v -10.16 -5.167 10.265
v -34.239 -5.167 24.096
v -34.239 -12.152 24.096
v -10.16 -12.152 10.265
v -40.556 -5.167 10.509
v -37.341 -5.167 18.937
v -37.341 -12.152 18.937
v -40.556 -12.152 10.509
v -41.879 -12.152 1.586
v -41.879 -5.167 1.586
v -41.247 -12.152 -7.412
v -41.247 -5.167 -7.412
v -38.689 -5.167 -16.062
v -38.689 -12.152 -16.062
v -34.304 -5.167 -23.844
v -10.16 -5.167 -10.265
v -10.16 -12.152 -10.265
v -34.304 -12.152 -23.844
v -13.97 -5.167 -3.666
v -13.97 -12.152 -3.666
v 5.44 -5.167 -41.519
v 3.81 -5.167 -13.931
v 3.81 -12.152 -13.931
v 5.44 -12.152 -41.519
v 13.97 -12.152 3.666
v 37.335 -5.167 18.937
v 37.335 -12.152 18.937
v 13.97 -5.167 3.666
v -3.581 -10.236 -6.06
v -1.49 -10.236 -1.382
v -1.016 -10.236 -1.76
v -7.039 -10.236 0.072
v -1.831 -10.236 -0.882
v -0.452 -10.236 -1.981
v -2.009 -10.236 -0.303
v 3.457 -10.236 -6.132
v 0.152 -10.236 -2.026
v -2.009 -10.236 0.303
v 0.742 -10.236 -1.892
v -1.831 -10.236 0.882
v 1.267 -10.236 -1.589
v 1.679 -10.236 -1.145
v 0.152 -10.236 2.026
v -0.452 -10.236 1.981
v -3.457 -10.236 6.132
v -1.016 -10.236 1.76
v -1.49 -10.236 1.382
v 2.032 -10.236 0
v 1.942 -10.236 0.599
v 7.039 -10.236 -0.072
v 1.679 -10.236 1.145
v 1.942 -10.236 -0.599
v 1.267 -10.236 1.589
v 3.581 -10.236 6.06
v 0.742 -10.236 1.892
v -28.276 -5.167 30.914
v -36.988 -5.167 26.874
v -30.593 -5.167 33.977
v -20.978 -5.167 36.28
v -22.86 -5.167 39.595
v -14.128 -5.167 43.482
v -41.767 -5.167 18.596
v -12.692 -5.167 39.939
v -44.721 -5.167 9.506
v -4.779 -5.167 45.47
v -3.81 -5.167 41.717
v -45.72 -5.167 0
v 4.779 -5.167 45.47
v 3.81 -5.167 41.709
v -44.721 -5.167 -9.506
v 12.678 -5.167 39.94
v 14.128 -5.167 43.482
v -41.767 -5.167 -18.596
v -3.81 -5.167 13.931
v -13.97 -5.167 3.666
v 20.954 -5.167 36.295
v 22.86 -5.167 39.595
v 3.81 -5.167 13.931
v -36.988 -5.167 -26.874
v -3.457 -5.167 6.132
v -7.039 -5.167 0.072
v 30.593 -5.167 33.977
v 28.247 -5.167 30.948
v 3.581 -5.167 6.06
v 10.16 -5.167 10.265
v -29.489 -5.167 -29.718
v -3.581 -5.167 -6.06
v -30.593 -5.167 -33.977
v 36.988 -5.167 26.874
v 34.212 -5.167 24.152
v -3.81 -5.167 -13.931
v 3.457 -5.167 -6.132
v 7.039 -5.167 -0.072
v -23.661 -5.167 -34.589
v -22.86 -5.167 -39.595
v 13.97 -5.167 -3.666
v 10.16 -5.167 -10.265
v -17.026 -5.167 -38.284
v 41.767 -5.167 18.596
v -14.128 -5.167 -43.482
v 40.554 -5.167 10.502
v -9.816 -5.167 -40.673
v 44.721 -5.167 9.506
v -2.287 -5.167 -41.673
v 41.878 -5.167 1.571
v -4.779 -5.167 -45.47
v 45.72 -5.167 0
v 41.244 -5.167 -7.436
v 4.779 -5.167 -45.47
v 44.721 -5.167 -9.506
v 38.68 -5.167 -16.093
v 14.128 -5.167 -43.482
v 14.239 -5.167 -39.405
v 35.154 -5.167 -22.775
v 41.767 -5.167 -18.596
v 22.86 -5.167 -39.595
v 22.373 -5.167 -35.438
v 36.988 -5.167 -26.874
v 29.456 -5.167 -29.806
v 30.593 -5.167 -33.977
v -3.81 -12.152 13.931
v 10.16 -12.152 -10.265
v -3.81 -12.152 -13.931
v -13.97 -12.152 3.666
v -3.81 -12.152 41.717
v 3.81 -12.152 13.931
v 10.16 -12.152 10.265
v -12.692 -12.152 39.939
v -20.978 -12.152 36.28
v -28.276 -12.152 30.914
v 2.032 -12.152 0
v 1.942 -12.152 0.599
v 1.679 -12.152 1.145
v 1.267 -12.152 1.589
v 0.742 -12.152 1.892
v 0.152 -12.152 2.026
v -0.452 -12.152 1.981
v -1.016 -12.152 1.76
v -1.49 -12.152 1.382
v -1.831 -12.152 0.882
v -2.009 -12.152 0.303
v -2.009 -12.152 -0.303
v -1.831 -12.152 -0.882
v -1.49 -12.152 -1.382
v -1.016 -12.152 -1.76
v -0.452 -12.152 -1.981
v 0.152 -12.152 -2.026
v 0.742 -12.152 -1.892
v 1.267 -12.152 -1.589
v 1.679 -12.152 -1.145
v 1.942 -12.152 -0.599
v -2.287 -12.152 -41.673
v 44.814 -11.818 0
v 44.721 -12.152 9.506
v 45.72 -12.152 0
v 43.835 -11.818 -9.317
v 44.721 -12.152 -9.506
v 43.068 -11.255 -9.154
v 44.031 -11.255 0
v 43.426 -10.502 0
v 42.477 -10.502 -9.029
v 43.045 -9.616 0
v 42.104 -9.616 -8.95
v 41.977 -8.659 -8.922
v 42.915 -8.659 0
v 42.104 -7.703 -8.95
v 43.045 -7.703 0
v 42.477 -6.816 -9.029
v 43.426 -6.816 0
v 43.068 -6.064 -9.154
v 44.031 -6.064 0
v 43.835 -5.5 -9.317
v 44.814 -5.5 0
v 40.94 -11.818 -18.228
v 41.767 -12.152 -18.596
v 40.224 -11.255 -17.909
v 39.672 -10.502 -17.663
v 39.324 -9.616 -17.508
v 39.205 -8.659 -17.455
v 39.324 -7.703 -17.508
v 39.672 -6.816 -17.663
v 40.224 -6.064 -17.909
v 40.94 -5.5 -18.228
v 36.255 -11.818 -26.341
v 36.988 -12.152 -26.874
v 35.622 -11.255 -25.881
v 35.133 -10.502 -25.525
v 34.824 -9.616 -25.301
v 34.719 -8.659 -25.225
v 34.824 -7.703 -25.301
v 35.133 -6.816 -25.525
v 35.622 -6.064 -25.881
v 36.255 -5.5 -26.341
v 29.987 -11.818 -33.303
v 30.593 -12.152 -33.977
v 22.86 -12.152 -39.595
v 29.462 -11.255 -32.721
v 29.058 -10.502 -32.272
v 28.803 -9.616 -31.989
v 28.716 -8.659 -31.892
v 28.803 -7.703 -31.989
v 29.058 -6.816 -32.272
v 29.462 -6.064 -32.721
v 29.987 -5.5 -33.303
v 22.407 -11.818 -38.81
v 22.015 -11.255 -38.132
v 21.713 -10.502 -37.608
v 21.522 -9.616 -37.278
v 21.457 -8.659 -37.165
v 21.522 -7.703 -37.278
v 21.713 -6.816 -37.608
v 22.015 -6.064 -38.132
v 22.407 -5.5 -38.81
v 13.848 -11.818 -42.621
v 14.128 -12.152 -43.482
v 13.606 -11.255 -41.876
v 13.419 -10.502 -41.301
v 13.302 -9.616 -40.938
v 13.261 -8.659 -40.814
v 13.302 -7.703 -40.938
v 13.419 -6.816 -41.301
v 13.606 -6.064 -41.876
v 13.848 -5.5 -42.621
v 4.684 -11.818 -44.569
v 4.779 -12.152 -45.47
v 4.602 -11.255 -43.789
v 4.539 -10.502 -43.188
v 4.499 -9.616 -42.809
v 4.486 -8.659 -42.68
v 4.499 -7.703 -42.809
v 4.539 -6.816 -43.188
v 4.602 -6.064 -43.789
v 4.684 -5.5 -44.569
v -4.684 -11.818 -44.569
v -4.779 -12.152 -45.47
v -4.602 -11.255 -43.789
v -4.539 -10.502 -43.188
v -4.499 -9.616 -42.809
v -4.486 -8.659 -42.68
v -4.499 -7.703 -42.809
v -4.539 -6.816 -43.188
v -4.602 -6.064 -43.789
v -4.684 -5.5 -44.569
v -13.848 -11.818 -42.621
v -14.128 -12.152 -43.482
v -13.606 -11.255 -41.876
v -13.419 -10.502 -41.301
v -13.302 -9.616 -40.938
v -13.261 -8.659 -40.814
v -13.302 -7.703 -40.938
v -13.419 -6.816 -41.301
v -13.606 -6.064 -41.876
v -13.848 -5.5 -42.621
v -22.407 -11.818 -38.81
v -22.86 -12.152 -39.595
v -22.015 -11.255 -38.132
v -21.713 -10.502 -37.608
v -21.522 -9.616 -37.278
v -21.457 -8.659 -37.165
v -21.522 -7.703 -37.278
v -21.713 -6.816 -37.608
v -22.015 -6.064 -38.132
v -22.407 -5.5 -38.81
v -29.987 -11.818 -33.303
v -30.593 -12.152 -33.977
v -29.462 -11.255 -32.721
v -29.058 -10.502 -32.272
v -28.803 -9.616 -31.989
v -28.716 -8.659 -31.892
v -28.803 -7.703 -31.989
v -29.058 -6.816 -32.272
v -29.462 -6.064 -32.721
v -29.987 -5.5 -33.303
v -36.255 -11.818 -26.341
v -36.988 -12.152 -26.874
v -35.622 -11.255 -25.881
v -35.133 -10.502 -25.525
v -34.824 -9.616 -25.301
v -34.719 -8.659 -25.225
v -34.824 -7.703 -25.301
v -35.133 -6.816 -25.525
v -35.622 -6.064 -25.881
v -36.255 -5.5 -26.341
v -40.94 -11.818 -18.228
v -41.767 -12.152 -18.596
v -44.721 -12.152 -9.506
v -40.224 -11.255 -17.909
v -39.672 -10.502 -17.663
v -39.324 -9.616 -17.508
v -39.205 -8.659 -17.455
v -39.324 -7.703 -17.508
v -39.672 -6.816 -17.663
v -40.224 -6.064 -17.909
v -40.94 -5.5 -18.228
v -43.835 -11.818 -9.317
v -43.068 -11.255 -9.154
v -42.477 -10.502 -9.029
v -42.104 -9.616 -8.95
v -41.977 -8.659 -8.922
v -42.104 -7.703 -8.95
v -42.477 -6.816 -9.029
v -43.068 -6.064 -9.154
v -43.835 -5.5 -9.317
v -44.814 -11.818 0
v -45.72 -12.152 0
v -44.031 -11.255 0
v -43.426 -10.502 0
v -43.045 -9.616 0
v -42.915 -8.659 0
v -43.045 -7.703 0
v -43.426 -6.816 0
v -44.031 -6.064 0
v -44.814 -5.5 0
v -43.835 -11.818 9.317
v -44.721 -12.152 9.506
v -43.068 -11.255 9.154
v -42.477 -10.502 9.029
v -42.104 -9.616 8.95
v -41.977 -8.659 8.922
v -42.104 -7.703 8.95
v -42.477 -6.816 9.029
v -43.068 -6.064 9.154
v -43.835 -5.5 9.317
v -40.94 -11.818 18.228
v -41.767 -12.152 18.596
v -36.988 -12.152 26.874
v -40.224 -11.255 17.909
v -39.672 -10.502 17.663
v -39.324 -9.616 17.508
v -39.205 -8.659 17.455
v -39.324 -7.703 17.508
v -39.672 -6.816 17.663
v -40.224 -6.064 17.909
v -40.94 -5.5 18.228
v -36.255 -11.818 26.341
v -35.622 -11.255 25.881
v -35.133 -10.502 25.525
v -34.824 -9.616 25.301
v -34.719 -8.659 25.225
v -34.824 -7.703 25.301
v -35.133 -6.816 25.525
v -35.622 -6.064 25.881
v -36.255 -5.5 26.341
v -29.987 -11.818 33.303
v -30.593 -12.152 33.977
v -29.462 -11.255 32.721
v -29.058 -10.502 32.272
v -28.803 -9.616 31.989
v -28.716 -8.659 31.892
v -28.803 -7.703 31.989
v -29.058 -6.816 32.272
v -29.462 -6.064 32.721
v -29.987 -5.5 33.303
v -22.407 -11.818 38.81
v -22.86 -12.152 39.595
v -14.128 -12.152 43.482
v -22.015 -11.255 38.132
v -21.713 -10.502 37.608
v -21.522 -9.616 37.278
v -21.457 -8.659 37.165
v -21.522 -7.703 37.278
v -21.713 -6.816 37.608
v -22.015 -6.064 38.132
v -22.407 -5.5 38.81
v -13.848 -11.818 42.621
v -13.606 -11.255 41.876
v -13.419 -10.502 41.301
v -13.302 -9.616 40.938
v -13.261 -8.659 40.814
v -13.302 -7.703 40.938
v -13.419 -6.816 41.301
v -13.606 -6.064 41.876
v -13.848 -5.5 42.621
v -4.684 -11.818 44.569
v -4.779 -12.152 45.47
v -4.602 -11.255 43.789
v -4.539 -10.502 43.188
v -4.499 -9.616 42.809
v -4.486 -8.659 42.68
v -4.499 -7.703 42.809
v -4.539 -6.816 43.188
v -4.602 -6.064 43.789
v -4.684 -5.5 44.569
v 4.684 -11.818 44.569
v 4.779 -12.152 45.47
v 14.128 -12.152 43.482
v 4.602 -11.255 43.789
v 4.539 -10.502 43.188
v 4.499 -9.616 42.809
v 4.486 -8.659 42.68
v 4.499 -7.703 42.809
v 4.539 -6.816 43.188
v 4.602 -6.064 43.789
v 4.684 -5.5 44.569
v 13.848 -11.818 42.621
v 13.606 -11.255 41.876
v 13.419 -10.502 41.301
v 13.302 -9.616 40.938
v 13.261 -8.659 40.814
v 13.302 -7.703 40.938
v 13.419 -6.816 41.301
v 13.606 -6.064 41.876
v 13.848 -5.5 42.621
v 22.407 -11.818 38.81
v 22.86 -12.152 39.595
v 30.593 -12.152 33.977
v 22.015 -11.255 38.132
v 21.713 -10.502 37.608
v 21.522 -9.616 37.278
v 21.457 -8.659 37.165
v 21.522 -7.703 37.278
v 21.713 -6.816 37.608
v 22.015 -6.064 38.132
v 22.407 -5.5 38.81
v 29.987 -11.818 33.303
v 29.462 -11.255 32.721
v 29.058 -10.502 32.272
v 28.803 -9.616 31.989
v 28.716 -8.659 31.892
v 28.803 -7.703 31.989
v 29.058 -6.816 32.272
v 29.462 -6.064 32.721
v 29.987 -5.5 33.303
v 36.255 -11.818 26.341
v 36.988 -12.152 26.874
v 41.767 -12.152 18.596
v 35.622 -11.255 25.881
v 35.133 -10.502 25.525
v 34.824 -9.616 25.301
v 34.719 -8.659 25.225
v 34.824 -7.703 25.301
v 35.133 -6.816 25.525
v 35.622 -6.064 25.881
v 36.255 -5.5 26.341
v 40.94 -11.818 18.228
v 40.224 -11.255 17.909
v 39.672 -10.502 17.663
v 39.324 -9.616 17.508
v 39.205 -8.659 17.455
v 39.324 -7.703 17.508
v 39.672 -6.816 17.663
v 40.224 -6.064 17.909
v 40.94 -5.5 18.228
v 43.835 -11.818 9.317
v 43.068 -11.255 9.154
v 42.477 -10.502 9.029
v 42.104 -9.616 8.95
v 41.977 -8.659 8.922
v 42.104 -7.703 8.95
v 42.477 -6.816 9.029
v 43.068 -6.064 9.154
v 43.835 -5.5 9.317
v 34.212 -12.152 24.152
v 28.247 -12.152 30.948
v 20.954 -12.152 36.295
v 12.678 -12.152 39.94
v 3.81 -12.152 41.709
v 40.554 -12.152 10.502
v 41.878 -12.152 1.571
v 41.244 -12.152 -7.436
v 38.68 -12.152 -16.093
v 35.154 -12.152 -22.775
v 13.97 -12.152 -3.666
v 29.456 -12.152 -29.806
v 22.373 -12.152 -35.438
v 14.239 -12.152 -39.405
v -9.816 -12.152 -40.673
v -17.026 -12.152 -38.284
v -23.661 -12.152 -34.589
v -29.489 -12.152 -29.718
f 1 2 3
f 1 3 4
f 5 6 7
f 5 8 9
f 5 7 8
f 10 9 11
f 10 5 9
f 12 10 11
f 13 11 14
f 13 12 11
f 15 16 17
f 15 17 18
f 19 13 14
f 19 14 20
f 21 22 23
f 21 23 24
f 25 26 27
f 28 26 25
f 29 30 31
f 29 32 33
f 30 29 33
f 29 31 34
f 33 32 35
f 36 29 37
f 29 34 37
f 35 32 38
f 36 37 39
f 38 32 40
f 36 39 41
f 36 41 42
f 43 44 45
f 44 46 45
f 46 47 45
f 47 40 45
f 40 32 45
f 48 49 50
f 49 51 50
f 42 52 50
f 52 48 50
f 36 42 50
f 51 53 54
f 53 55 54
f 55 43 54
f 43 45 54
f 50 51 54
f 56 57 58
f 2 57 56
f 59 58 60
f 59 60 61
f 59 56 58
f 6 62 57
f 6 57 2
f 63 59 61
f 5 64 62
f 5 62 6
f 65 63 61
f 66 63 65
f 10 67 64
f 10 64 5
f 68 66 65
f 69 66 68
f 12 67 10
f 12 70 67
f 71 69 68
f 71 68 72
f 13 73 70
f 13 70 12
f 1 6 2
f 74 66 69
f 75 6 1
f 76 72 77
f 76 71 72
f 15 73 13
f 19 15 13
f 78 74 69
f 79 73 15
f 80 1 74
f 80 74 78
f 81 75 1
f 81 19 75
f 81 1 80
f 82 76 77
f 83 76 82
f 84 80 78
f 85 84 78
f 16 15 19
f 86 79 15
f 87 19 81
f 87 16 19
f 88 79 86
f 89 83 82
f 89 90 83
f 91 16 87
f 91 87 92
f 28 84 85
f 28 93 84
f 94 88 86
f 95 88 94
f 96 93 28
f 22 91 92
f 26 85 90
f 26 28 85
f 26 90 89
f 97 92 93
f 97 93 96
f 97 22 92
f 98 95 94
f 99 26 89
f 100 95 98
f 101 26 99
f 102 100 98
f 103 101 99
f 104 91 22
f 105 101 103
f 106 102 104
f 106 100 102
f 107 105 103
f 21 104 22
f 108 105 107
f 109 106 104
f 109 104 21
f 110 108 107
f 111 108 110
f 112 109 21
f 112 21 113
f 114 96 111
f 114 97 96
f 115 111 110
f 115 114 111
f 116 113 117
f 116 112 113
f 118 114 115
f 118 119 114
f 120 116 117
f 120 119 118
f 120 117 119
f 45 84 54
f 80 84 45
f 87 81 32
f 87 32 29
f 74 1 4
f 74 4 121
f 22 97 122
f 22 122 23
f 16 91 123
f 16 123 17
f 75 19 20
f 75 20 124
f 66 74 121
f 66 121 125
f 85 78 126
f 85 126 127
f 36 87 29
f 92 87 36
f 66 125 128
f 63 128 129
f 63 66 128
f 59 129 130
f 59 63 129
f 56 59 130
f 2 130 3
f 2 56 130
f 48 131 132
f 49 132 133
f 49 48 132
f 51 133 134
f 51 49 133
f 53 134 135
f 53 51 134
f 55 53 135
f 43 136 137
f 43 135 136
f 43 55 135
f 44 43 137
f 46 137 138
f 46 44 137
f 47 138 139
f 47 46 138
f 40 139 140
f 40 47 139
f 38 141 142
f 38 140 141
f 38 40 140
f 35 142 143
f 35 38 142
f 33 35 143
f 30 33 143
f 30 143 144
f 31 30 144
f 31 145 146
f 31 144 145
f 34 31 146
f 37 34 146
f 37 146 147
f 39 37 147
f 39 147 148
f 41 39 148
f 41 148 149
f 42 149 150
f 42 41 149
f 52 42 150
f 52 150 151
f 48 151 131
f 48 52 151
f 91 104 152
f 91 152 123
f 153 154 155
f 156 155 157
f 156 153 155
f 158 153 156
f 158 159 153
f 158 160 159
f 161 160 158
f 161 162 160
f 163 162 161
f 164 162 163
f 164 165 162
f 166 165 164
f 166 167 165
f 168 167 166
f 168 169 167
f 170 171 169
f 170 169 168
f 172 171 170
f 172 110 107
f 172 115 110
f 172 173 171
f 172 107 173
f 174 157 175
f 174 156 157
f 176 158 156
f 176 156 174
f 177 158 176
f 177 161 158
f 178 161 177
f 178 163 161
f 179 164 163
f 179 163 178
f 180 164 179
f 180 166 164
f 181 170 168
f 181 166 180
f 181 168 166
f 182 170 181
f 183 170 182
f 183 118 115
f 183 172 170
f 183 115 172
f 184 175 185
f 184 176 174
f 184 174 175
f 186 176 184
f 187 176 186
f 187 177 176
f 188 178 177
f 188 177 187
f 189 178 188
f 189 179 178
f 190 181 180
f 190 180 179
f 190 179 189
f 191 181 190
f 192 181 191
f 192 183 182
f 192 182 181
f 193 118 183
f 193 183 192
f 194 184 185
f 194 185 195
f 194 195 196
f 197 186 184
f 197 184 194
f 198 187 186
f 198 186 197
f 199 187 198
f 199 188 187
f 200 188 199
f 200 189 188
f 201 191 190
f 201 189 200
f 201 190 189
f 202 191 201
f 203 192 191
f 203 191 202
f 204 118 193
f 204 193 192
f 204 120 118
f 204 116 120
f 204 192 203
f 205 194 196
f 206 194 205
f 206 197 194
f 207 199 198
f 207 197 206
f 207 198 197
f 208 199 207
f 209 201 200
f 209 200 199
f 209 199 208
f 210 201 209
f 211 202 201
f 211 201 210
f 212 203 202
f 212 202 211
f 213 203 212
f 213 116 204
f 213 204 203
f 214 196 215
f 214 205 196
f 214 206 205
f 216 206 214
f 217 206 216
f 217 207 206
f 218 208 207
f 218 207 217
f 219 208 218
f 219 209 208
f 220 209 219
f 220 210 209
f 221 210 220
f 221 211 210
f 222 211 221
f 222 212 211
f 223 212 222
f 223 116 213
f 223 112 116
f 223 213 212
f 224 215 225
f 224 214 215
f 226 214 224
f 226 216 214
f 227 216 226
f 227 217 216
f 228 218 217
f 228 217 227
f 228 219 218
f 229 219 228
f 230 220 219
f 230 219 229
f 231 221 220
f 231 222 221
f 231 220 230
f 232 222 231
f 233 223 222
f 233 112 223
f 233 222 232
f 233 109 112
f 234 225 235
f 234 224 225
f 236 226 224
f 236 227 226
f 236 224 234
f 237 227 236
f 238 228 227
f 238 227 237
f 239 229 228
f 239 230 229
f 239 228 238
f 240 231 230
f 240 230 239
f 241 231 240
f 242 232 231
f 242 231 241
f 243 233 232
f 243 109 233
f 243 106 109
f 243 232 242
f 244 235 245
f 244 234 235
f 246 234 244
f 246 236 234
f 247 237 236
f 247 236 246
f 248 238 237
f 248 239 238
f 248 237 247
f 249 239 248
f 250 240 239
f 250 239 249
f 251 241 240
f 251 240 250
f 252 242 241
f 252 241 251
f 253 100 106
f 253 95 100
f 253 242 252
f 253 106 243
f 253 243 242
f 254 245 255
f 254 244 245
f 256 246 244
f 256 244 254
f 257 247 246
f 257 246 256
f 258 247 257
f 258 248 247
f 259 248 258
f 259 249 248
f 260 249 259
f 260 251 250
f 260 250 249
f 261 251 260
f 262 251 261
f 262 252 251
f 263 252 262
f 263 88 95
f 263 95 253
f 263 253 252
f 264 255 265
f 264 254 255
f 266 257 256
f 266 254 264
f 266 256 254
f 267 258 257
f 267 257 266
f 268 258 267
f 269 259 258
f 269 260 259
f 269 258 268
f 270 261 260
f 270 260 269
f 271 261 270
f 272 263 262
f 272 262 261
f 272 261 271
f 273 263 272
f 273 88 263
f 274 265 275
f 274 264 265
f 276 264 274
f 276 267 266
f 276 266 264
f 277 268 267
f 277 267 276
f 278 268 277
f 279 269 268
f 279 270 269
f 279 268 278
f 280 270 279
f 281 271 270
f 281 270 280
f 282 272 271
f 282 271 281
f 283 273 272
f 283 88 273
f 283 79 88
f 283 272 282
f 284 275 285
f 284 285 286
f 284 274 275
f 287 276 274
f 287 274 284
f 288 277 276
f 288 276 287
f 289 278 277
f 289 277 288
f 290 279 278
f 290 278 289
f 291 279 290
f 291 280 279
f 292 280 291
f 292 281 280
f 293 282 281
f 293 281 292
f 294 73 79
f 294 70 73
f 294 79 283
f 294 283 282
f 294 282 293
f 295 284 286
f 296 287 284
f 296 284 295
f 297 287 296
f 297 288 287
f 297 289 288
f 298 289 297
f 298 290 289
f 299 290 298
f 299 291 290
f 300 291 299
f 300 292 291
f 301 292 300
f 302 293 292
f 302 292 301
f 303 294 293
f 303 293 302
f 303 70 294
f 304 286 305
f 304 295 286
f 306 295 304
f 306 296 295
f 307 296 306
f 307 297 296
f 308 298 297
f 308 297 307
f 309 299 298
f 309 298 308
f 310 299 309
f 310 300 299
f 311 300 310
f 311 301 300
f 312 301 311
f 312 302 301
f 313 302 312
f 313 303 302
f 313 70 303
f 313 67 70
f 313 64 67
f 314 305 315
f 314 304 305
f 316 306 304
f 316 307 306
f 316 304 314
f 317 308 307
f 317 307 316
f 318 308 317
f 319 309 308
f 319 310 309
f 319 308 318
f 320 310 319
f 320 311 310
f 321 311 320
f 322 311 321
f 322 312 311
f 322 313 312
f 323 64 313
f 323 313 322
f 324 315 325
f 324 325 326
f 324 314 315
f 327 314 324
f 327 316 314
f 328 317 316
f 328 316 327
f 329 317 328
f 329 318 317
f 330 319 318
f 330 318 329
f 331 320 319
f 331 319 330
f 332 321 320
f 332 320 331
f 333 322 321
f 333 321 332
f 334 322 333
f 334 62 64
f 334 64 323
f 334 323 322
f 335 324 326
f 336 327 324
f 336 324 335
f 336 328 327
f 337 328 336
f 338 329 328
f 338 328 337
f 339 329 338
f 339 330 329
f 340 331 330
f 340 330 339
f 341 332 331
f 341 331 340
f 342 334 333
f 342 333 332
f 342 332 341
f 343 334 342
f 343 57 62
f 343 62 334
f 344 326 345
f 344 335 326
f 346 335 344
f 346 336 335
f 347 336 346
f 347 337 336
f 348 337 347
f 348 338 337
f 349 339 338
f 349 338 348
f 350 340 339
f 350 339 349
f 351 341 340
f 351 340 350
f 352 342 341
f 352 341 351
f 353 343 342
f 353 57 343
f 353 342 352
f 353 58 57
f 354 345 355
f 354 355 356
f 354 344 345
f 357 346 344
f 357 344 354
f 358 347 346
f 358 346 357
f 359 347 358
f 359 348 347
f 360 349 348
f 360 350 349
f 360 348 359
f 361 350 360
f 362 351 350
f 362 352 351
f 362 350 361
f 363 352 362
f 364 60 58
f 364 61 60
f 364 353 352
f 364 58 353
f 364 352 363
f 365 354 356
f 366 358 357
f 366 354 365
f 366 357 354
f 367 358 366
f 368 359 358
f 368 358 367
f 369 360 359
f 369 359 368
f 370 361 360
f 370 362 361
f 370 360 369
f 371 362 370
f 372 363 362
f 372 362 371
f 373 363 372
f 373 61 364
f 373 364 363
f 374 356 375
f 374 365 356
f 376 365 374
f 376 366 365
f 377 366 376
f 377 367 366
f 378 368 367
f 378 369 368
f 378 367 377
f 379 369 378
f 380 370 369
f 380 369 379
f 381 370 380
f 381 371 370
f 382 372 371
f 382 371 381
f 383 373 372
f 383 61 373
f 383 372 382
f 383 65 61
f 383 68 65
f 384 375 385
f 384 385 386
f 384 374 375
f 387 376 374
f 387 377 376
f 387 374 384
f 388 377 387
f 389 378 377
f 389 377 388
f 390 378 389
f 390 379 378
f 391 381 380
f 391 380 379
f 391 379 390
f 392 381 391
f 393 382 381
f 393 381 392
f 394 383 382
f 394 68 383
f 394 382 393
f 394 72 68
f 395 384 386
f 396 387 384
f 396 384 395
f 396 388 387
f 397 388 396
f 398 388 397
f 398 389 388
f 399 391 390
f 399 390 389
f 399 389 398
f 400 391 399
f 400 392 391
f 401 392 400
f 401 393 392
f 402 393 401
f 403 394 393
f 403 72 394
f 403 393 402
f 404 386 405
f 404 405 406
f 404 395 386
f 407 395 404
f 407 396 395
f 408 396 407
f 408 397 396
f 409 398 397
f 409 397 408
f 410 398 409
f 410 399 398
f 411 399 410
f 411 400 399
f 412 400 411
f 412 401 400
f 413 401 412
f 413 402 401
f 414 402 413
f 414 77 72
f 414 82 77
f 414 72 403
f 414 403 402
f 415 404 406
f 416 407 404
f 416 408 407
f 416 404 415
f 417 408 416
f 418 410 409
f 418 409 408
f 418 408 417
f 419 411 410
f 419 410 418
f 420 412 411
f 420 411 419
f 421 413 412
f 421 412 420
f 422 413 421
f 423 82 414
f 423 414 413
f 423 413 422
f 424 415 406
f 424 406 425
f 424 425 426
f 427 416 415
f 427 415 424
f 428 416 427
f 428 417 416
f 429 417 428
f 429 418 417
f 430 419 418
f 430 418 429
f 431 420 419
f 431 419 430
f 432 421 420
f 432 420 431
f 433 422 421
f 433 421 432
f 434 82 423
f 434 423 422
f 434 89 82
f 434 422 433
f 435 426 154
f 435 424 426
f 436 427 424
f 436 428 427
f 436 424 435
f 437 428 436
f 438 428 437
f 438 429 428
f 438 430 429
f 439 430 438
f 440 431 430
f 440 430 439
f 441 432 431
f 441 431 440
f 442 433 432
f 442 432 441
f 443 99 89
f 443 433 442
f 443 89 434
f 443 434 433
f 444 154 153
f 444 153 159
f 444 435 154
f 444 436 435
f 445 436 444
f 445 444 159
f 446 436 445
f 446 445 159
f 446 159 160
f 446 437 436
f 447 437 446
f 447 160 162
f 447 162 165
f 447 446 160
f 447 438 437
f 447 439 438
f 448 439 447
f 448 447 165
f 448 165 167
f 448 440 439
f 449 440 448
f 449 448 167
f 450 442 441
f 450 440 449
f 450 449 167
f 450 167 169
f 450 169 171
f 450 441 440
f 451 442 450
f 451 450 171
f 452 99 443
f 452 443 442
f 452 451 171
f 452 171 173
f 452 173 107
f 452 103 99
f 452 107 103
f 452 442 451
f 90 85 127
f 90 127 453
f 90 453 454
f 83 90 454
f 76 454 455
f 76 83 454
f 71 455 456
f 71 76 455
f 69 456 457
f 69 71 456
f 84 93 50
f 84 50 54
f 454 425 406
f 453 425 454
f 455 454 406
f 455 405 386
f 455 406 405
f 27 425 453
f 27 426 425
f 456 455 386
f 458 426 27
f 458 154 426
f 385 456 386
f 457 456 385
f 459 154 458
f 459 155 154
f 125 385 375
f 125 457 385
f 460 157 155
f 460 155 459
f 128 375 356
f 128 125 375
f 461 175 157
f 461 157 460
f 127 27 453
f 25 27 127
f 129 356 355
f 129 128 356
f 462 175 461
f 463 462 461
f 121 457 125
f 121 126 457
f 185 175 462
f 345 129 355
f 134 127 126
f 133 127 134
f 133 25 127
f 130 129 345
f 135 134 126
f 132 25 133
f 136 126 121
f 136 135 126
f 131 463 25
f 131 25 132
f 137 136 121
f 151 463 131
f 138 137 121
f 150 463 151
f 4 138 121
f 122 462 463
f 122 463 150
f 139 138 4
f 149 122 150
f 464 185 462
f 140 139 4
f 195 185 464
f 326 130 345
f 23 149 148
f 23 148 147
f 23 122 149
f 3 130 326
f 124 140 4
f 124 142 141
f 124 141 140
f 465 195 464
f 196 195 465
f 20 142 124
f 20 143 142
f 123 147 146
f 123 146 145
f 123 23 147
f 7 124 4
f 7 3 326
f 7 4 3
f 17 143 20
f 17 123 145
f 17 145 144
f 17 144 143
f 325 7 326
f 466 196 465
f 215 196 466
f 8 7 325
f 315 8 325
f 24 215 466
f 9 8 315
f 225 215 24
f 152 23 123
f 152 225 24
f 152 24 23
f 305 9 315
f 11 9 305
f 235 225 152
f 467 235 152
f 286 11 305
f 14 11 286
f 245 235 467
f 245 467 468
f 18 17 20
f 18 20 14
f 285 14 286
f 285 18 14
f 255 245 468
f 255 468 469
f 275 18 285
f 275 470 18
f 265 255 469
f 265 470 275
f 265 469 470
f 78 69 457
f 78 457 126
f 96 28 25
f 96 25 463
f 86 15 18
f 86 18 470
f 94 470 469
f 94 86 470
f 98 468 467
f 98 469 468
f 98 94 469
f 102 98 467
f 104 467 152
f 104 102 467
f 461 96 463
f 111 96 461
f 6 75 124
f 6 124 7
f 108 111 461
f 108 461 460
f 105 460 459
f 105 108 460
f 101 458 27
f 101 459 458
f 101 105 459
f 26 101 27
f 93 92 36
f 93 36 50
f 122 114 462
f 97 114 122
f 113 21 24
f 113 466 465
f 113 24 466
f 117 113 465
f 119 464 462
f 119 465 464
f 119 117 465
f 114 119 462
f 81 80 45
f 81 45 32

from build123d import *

# Parameters (mm, degrees)
F2_R     = 2.032
F3_DEPTH = 15.875
F4_DEPTH = 10.2362


# Not quite as in the source:
# - a feature names something its author has since deleted; it is built from what else it names


with BuildPart() as f1:
    # F0 (on Top) → F1 (revolve)
    with BuildSketch(Plane.XY):
        with BuildLine():
            Line((0, -5.1666409709), (0, -12.1516409709))
            Line((0, -12.1516409709), (45.72, -12.1516409709))
            ThreePointArc((45.72, -12.1516409709), (42.9147529825, -8.6591409709), (45.72, -5.1666409709))
            Line((45.72, -5.1666409709), (0, -5.1666409709))
        make_face()
    revolve(axis=Axis((0, -8.561744864, 0), (0, 1, 0)))

    # F2 (on Front) → F3 (cut)
    with BuildSketch(Plane.XZ):
        with BuildLine():
            Line((13.97, 3.6661742094), (13.97, -3.6661742094))
            Line((13.97, -3.6661742094), (38.6802071591, -16.0932599922))
            ThreePointArc((38.6802071591, -16.0932599922), (41.8782799617, 1.5705660984), (37.3345500424, 18.9369975174))
            Line((37.3345500424, 18.9369975174), (13.97, 3.6661742094))
        make_face()
        with BuildLine():
            Line((3.81, 41.7094333604), (3.81, 13.9314619955))
            Line((3.81, 13.9314619955), (10.16, 10.2652877862))
            Line((10.16, 10.2652877862), (34.2119266748, 24.1516741264))
            ThreePointArc((34.2119266748, 24.1516741264), (20.9542761873, 36.2954737188), (3.81, 41.7094333604))
        make_face()
        with BuildLine():
            Line((-34.2388233597, 24.0958361272), (-10.16, 10.2652877862))
            Line((-10.16, 10.2652877862), (-3.81, 13.9314619955))
            Line((-3.81, 13.9314619955), (-3.81, 41.7173788368))
            ThreePointArc((-3.81, 41.7173788368), (-20.9781685322, 36.2803485402), (-34.2388233597, 24.0958361272))
        make_face()
        with BuildLine():
            Line((-38.6893950171, -16.0623838358), (-13.97, -3.6661742094))
            Line((-13.97, -3.6661742094), (-13.97, 3.6661742094))
            Line((-13.97, 3.6661742094), (-37.3405062231, 18.9372899969))
            ThreePointArc((-37.3405062231, 18.9372899969), (-41.8787701809, 1.5863648371), (-38.6893950171, -16.0623838358))
        make_face()
        with BuildLine():
            Line((-3.81, -13.9314619955), (-10.16, -10.2652877862))
            Line((-10.16, -10.2652877862), (-34.3038742814, -23.844345572))
            ThreePointArc((-34.3038742814, -23.844345572), (-20.4303998238, -36.5921428083), (-2.2874128339, -41.6726596109))
            Line((-2.2874128339, -41.6726596109), (-3.81, -13.9314619955))
        make_face()
        with BuildLine():
            Line((10.16, -10.2652877862), (3.81, -13.9314619955))
            Line((3.81, -13.9314619955), (5.4400267393, -41.5192010913))
            ThreePointArc((5.4400267393, -41.5192010913), (22.3730839146, -35.4381883413), (35.1536490306, -22.7746857971))
            Line((35.1536490306, -22.7746857971), (10.16, -10.2652877862))
        make_face()
        Circle(F2_R)
    extrude(amount=F3_DEPTH, mode=Mode.SUBTRACT)

    # F2 (on Front) → F4 (cut)
    with BuildSketch(Plane.XZ):
        Polygon((-7.0386894402, 0.071686571), (-3.5814271117, -6.059840579), (3.4572623285, -6.1315271501), (7.0386894402, -0.071686571), (3.5814271117, 6.059840579), (-3.4572623285, 6.1315271501), align=None)
        Circle(F2_R, mode=Mode.SUBTRACT)
    extrude(amount=F4_DEPTH, mode=Mode.SUBTRACT)


solid = f1.part
